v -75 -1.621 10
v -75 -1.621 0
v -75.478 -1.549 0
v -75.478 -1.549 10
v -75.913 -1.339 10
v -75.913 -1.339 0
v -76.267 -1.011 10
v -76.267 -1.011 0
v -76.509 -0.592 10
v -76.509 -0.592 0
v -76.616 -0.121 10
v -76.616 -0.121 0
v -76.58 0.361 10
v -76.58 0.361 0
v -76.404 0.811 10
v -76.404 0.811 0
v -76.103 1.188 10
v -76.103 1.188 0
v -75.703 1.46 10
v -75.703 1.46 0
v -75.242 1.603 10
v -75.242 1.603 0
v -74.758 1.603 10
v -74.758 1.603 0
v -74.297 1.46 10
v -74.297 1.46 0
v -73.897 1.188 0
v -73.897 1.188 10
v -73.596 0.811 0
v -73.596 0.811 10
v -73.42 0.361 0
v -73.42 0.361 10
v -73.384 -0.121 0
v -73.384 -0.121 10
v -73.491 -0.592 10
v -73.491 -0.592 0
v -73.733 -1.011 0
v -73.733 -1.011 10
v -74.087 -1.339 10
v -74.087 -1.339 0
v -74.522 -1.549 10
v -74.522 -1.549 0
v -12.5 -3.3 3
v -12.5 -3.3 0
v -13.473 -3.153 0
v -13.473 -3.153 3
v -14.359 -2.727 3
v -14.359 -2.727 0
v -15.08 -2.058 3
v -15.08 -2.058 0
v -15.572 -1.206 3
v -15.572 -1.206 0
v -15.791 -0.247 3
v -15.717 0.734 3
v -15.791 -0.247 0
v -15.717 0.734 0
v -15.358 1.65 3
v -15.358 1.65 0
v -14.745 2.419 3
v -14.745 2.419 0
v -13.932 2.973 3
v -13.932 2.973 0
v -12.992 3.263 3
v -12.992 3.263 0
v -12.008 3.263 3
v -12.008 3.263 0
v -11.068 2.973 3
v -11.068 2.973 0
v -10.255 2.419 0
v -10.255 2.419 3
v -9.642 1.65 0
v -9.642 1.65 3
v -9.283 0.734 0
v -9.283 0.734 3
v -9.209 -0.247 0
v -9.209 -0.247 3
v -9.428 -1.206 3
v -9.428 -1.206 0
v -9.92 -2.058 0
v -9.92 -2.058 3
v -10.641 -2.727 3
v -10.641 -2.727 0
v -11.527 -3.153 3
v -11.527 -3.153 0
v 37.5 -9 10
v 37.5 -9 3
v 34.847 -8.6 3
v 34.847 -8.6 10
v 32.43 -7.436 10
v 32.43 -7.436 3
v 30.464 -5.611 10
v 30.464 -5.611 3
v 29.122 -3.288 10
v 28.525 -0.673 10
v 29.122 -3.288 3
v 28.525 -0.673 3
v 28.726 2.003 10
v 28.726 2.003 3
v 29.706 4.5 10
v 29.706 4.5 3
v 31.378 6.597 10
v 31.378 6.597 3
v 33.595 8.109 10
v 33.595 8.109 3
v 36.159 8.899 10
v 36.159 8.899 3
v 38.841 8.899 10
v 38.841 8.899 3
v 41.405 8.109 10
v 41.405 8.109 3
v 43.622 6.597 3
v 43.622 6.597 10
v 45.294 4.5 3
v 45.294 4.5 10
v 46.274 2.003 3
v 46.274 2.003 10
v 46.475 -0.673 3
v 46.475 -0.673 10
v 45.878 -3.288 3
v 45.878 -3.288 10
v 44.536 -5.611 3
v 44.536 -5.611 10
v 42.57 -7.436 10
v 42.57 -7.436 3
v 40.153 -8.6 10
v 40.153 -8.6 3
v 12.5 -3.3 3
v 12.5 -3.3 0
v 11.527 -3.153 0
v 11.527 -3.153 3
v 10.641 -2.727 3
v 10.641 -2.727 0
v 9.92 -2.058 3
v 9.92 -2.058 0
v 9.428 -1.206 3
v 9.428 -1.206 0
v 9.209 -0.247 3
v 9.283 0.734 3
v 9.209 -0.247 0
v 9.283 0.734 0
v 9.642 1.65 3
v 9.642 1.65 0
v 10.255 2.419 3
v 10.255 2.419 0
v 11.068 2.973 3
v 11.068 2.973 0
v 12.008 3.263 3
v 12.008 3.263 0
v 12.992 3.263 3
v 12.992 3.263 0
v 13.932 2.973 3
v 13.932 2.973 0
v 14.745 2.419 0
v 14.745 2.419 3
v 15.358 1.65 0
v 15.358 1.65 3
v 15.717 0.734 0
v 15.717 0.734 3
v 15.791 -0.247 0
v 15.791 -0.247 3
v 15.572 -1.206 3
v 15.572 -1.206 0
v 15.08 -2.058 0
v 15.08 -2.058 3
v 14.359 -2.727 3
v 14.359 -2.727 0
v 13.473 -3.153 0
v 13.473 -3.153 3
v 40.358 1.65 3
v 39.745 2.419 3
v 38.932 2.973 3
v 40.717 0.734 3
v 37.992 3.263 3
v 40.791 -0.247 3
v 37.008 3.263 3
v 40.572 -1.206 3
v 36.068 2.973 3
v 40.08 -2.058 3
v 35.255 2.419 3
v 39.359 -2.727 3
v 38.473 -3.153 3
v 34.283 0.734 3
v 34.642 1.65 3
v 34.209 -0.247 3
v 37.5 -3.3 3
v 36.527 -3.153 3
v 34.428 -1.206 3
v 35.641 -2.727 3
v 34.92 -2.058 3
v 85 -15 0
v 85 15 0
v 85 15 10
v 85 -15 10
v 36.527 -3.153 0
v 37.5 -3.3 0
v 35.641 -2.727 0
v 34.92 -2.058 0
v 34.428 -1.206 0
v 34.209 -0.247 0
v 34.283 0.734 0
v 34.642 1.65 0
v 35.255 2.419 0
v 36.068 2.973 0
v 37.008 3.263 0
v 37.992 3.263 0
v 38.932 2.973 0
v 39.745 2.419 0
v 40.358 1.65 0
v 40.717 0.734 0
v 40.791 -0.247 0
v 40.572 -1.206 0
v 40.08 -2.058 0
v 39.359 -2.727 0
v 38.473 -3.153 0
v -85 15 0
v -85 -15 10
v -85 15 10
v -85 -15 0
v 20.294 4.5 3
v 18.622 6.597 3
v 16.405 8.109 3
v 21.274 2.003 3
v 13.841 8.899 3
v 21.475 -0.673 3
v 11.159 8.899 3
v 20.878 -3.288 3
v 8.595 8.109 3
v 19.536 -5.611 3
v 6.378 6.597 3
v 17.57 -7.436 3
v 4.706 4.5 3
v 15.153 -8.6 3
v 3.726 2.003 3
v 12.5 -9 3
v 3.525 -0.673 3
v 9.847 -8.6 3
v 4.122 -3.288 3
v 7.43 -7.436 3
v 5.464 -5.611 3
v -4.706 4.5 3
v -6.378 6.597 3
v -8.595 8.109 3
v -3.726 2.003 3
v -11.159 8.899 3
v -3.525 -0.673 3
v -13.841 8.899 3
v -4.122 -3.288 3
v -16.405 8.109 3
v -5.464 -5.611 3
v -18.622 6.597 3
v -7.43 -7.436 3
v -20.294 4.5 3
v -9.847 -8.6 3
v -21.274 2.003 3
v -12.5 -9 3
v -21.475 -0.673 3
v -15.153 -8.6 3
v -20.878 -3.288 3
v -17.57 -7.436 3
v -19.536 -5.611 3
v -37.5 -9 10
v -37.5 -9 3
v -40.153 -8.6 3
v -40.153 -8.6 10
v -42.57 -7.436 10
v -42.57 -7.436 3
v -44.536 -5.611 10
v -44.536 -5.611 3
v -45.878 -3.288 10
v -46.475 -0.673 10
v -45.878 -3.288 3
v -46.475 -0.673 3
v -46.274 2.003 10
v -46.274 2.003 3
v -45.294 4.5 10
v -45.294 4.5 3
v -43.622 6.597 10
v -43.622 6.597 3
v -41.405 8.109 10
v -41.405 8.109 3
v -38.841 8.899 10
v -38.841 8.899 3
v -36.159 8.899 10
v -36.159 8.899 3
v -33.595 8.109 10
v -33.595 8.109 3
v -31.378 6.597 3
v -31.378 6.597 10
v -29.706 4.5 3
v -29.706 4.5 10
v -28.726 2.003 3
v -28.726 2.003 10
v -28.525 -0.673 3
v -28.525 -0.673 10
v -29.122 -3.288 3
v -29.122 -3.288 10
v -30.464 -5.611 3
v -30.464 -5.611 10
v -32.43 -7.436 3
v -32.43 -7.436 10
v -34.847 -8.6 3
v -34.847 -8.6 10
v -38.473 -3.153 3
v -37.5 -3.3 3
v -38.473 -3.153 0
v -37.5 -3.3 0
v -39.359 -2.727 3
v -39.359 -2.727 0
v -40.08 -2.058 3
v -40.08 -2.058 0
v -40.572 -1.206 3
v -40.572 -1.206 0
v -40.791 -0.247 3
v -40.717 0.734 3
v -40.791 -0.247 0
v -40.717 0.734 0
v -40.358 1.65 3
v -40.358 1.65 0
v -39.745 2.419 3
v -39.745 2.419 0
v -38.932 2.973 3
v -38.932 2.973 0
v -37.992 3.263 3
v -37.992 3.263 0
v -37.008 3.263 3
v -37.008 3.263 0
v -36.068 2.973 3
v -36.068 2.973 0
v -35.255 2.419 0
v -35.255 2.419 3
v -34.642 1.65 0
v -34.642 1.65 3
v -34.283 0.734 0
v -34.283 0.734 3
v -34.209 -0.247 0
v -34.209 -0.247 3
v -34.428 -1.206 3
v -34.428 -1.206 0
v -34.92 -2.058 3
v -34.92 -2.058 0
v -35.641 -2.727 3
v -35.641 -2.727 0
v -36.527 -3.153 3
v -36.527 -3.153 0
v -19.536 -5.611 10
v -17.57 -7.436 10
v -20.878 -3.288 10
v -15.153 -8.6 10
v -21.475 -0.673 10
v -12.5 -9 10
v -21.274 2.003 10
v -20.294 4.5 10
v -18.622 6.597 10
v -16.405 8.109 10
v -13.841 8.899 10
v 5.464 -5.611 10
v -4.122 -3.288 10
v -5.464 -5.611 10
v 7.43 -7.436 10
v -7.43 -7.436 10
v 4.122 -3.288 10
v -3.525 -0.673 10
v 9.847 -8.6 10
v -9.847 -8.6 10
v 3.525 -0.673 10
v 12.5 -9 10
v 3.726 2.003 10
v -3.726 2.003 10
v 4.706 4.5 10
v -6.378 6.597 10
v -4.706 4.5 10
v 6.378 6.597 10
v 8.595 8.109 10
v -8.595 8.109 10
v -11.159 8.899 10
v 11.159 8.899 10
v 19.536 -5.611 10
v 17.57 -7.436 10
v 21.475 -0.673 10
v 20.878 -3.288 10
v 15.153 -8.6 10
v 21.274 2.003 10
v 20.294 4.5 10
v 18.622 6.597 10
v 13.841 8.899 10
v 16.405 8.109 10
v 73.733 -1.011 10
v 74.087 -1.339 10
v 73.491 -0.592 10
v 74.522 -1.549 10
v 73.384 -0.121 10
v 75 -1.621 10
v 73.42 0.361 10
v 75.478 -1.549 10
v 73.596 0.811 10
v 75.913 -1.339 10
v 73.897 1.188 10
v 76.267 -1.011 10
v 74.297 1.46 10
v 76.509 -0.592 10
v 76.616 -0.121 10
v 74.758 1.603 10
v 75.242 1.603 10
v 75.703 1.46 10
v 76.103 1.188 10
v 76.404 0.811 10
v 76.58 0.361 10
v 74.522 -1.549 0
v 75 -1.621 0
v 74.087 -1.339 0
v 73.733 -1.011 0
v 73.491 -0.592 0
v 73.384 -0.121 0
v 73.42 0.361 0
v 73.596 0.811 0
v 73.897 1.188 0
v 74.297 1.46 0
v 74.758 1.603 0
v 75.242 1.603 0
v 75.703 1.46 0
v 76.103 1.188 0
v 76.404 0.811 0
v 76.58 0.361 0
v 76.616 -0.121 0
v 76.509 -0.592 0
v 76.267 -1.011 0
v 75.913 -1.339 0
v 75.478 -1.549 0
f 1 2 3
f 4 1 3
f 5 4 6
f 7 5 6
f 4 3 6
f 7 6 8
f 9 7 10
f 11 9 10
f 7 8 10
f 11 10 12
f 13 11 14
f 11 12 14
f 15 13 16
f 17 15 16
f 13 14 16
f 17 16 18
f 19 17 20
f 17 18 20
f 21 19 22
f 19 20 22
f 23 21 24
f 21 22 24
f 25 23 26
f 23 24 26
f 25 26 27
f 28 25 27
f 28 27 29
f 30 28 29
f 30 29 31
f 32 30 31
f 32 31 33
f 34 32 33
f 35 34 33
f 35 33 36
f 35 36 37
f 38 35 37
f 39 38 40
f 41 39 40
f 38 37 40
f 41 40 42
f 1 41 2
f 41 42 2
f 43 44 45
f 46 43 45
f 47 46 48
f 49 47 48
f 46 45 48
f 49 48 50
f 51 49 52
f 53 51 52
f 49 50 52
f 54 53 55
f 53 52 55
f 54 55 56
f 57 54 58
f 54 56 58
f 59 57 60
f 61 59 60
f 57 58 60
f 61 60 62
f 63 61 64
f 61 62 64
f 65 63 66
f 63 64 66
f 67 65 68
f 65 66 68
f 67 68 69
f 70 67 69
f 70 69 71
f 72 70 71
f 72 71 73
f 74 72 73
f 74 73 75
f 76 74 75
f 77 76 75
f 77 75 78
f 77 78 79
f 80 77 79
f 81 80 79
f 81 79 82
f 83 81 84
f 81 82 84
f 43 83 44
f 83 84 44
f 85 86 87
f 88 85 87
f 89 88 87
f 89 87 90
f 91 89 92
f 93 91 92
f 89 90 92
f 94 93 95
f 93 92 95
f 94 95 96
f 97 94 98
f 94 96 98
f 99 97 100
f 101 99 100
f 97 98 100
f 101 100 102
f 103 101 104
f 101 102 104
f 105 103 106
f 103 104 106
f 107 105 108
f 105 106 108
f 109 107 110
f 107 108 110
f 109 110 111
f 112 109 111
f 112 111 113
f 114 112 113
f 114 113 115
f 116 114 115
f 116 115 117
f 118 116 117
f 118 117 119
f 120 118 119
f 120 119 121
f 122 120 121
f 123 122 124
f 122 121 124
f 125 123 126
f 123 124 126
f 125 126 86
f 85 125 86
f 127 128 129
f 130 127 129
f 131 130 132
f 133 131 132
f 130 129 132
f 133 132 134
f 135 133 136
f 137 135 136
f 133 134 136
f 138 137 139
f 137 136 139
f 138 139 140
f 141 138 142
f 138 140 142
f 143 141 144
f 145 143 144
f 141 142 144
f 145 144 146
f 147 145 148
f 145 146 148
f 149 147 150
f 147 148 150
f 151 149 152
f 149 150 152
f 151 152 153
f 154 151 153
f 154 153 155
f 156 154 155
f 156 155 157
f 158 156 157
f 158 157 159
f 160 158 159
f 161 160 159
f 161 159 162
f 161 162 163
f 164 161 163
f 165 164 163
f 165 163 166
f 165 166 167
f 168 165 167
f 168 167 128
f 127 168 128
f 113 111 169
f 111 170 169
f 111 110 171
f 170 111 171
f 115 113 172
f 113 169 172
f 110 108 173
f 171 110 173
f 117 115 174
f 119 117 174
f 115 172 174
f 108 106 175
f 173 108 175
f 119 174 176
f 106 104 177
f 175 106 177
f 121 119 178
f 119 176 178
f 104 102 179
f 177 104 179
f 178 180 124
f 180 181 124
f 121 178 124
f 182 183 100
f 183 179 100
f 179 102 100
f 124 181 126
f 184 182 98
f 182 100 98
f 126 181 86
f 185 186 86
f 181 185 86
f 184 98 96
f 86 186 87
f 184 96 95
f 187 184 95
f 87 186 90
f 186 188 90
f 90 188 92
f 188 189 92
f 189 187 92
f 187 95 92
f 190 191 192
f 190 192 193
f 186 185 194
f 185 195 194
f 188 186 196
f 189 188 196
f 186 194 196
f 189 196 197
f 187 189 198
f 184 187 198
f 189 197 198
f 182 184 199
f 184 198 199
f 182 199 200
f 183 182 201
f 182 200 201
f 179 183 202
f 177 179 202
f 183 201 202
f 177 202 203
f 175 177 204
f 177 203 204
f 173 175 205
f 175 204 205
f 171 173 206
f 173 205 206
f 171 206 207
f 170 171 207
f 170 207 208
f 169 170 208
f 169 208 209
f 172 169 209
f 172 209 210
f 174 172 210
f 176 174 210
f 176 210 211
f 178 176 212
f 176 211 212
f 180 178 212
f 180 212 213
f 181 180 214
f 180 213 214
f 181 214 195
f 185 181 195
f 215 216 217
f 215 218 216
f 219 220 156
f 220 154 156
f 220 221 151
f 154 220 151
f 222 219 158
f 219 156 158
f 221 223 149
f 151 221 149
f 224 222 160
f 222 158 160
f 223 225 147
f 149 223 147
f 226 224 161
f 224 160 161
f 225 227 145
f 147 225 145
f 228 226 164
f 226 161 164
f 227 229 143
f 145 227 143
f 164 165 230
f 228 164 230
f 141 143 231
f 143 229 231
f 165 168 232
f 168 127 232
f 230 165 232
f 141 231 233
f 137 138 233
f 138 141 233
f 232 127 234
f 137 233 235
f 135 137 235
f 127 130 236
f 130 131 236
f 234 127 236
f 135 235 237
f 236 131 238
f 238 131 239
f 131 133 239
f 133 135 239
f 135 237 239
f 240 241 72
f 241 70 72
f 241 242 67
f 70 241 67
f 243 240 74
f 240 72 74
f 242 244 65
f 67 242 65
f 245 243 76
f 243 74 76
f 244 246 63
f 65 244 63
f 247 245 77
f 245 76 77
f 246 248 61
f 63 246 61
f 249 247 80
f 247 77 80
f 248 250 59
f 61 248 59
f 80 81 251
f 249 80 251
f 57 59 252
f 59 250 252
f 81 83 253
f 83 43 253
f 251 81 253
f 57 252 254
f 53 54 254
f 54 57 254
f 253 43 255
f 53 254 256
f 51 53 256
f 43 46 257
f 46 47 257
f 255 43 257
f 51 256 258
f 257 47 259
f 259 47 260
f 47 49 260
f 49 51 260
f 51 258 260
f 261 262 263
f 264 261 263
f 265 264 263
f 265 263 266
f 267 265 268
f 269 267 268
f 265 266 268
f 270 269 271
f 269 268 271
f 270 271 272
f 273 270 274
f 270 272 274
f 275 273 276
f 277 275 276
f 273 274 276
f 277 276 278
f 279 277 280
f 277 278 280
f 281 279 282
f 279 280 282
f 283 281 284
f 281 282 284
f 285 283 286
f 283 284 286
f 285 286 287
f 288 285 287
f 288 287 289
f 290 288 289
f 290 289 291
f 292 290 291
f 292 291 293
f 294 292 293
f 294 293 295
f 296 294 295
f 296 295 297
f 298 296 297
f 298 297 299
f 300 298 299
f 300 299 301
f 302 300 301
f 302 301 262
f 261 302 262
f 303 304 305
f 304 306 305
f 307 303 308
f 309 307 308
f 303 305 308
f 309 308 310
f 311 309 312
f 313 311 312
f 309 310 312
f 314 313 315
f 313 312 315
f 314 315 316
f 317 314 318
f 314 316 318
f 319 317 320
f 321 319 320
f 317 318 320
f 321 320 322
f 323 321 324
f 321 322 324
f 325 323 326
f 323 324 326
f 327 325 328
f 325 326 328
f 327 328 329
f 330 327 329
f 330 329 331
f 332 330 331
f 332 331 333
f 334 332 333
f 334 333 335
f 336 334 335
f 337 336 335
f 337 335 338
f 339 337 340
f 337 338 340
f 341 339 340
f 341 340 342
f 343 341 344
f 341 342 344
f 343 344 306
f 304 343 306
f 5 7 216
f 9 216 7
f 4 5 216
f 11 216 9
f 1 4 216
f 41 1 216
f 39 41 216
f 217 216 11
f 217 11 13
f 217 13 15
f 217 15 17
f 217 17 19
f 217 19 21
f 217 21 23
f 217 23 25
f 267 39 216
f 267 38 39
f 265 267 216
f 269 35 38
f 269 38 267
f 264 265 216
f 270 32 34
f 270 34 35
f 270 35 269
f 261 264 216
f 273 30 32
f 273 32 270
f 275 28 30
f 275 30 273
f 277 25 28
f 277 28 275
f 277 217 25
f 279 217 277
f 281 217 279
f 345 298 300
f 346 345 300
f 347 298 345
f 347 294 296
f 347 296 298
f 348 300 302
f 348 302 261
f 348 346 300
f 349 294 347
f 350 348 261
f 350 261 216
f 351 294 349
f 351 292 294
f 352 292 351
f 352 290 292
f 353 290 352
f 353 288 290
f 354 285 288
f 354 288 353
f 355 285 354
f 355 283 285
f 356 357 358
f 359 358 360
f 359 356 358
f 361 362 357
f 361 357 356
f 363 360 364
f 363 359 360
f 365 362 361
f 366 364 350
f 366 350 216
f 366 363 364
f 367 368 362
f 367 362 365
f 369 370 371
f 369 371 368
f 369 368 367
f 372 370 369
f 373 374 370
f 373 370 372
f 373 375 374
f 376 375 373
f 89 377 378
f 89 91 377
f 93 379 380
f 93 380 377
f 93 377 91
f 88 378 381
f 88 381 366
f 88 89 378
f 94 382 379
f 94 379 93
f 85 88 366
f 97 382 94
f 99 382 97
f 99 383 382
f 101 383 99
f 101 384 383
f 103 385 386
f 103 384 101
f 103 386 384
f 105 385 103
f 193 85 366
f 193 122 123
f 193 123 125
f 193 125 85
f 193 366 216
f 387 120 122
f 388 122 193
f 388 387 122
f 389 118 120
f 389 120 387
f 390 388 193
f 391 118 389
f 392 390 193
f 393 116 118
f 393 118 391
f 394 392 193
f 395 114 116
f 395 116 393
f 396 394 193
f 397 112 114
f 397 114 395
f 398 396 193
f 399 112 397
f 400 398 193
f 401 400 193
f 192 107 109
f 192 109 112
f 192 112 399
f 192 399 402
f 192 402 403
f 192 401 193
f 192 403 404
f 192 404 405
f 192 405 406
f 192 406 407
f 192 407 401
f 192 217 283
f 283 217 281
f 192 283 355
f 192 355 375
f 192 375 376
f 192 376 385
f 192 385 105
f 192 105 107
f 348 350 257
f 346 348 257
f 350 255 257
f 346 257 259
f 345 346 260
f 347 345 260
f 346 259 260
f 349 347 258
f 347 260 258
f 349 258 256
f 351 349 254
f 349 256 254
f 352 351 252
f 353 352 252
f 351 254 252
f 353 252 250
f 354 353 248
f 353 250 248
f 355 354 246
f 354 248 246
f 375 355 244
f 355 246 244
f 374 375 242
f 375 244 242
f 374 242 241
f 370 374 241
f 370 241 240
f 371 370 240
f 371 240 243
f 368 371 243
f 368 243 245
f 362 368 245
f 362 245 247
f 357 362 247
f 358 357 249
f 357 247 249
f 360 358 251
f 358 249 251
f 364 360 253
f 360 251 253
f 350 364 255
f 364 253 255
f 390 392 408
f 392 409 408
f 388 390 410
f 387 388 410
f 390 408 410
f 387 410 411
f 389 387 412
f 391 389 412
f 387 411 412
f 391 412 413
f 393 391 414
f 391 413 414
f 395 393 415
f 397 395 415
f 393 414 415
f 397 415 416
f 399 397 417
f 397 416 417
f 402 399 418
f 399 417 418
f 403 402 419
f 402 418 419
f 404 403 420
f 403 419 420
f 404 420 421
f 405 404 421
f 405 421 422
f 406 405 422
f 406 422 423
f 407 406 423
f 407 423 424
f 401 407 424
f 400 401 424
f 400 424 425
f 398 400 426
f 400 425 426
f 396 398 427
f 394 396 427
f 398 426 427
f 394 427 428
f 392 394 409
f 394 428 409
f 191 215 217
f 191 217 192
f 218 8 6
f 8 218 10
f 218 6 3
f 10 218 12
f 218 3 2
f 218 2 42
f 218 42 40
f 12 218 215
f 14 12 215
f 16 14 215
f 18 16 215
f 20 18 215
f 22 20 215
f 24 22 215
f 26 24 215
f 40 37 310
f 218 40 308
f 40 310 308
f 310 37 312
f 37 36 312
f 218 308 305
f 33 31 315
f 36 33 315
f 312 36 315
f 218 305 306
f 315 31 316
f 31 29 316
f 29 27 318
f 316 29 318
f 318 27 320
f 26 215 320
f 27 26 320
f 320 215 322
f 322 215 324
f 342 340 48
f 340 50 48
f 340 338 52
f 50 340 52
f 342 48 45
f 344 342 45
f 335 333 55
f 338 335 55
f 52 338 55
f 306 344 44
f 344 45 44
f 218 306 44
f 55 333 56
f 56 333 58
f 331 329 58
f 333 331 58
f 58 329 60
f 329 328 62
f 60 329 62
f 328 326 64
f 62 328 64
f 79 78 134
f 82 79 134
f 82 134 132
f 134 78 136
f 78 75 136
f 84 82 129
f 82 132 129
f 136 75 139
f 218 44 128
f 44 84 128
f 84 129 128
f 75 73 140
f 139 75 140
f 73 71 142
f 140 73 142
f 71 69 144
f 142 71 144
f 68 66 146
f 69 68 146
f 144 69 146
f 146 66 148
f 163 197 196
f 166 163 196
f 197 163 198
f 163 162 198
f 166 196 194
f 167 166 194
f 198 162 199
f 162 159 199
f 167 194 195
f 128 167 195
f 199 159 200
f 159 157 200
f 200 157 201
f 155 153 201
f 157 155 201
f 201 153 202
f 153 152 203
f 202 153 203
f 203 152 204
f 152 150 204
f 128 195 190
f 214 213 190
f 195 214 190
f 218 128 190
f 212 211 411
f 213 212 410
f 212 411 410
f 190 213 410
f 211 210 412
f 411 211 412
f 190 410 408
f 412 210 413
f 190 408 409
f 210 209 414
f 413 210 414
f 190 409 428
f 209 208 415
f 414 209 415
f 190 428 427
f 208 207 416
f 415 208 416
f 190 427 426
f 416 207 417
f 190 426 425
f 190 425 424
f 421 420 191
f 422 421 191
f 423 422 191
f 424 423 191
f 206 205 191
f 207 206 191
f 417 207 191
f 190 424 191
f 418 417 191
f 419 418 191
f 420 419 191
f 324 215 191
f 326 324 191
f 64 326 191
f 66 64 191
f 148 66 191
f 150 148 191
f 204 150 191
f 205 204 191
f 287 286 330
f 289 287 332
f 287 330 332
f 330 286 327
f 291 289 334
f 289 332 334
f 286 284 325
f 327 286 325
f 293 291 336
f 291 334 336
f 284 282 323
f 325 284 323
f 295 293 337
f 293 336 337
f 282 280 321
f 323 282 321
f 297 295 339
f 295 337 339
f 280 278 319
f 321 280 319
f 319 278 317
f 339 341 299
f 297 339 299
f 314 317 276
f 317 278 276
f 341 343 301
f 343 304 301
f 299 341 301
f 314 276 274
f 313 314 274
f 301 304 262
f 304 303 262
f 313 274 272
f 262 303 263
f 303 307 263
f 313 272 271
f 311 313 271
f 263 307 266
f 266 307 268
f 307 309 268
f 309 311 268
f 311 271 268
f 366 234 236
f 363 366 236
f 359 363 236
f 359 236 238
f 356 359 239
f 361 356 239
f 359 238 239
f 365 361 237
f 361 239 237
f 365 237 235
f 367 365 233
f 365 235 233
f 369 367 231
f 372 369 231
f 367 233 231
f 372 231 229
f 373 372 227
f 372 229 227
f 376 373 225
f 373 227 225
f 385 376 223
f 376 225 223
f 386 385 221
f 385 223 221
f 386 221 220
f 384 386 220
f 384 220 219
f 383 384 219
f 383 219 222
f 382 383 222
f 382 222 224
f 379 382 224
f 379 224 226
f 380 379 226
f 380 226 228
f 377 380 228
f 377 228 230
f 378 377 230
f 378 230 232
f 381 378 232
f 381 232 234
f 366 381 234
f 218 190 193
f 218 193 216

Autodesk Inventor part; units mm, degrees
ref_plane "YZ Plane" through (0, 0, 0) normal (1, 0, 0) x (0, 1, 0)
ref_plane "XZ Plane" through (0, 0, 0) normal (0, 1, 0) x (-1, 0, 0)
ref_plane "XY Plane" through (0, 0, 0) normal (0, 0, 1) x (1, 0, 0)
sketch "Sketch1" plane through (0, 0, 0) normal (0, 0, 1) x (1, 0, 0)
  line L0 (-85, 15) -> (85, 15)
  line L1 (85, 15) -> (85, -15)
  line L2 (85, -15) -> (-85, -15)
  line L3 (-85, -15) -> (-85, 15)
  point P0 (0, 0)
  dimension "d0" = 30
  dimension "d1" = 170
  dimension "d2" = 85
  dimension "d3" = 15
extrude "Extrusion1" add sketch "Sketch1" along normal blind 10
sketch "Sketch2" plane through (0, 0, 10) normal (0, 0, 1) x (1, 0, 0)
  point P0 (0, 0)
  point P1 (-37.5, 0)
  point P2 (-12.5, 0)
  point P3 (12.5, 0)
  point P4 (37.5, 0)
  dimension "d30" = 25
  dimension "d31" = 25
  dimension "d32" = 25
  dimension "d33" = 12.5
hole "Hole1" at (-37.5, 0, 10) at (-12.5, 0, 10) at (12.5, 0, 10) at (37.5, 0, 10) direction (0, 0, -1) diameter 6.6 end through all counterbore diameter 18 counterbore depth 7 clearance for "Hex Head Cap Screw ISO 24017" size "M6" standard "ISO"
sketch "Sketch3" plane through (0, 0, 10) normal (0, 0, 1) x (1, 0, 0)
  point P0 (0, 0)
  point P1 (75, 0)
  point P2 (-75, 0)
  dimension "d16" = 150
  dimension "d17" = 75
hole "Hole2" at (75, 0, 10) at (-75, 0, 10) direction (0, 0, -1) diameter 3.242 end through all thread size "M4x0.7" class "6H" standard "ISO Metric profile"
equation "\"d2\" = 0.5 * d1"
equation "\"d3\" = 0.5 * d0"
equation "\"d33\" = 0.5 * d31"
equation "\"d17\" = 0.5 * d16"
properties part number "zStackJackAttach_Oct2016"
